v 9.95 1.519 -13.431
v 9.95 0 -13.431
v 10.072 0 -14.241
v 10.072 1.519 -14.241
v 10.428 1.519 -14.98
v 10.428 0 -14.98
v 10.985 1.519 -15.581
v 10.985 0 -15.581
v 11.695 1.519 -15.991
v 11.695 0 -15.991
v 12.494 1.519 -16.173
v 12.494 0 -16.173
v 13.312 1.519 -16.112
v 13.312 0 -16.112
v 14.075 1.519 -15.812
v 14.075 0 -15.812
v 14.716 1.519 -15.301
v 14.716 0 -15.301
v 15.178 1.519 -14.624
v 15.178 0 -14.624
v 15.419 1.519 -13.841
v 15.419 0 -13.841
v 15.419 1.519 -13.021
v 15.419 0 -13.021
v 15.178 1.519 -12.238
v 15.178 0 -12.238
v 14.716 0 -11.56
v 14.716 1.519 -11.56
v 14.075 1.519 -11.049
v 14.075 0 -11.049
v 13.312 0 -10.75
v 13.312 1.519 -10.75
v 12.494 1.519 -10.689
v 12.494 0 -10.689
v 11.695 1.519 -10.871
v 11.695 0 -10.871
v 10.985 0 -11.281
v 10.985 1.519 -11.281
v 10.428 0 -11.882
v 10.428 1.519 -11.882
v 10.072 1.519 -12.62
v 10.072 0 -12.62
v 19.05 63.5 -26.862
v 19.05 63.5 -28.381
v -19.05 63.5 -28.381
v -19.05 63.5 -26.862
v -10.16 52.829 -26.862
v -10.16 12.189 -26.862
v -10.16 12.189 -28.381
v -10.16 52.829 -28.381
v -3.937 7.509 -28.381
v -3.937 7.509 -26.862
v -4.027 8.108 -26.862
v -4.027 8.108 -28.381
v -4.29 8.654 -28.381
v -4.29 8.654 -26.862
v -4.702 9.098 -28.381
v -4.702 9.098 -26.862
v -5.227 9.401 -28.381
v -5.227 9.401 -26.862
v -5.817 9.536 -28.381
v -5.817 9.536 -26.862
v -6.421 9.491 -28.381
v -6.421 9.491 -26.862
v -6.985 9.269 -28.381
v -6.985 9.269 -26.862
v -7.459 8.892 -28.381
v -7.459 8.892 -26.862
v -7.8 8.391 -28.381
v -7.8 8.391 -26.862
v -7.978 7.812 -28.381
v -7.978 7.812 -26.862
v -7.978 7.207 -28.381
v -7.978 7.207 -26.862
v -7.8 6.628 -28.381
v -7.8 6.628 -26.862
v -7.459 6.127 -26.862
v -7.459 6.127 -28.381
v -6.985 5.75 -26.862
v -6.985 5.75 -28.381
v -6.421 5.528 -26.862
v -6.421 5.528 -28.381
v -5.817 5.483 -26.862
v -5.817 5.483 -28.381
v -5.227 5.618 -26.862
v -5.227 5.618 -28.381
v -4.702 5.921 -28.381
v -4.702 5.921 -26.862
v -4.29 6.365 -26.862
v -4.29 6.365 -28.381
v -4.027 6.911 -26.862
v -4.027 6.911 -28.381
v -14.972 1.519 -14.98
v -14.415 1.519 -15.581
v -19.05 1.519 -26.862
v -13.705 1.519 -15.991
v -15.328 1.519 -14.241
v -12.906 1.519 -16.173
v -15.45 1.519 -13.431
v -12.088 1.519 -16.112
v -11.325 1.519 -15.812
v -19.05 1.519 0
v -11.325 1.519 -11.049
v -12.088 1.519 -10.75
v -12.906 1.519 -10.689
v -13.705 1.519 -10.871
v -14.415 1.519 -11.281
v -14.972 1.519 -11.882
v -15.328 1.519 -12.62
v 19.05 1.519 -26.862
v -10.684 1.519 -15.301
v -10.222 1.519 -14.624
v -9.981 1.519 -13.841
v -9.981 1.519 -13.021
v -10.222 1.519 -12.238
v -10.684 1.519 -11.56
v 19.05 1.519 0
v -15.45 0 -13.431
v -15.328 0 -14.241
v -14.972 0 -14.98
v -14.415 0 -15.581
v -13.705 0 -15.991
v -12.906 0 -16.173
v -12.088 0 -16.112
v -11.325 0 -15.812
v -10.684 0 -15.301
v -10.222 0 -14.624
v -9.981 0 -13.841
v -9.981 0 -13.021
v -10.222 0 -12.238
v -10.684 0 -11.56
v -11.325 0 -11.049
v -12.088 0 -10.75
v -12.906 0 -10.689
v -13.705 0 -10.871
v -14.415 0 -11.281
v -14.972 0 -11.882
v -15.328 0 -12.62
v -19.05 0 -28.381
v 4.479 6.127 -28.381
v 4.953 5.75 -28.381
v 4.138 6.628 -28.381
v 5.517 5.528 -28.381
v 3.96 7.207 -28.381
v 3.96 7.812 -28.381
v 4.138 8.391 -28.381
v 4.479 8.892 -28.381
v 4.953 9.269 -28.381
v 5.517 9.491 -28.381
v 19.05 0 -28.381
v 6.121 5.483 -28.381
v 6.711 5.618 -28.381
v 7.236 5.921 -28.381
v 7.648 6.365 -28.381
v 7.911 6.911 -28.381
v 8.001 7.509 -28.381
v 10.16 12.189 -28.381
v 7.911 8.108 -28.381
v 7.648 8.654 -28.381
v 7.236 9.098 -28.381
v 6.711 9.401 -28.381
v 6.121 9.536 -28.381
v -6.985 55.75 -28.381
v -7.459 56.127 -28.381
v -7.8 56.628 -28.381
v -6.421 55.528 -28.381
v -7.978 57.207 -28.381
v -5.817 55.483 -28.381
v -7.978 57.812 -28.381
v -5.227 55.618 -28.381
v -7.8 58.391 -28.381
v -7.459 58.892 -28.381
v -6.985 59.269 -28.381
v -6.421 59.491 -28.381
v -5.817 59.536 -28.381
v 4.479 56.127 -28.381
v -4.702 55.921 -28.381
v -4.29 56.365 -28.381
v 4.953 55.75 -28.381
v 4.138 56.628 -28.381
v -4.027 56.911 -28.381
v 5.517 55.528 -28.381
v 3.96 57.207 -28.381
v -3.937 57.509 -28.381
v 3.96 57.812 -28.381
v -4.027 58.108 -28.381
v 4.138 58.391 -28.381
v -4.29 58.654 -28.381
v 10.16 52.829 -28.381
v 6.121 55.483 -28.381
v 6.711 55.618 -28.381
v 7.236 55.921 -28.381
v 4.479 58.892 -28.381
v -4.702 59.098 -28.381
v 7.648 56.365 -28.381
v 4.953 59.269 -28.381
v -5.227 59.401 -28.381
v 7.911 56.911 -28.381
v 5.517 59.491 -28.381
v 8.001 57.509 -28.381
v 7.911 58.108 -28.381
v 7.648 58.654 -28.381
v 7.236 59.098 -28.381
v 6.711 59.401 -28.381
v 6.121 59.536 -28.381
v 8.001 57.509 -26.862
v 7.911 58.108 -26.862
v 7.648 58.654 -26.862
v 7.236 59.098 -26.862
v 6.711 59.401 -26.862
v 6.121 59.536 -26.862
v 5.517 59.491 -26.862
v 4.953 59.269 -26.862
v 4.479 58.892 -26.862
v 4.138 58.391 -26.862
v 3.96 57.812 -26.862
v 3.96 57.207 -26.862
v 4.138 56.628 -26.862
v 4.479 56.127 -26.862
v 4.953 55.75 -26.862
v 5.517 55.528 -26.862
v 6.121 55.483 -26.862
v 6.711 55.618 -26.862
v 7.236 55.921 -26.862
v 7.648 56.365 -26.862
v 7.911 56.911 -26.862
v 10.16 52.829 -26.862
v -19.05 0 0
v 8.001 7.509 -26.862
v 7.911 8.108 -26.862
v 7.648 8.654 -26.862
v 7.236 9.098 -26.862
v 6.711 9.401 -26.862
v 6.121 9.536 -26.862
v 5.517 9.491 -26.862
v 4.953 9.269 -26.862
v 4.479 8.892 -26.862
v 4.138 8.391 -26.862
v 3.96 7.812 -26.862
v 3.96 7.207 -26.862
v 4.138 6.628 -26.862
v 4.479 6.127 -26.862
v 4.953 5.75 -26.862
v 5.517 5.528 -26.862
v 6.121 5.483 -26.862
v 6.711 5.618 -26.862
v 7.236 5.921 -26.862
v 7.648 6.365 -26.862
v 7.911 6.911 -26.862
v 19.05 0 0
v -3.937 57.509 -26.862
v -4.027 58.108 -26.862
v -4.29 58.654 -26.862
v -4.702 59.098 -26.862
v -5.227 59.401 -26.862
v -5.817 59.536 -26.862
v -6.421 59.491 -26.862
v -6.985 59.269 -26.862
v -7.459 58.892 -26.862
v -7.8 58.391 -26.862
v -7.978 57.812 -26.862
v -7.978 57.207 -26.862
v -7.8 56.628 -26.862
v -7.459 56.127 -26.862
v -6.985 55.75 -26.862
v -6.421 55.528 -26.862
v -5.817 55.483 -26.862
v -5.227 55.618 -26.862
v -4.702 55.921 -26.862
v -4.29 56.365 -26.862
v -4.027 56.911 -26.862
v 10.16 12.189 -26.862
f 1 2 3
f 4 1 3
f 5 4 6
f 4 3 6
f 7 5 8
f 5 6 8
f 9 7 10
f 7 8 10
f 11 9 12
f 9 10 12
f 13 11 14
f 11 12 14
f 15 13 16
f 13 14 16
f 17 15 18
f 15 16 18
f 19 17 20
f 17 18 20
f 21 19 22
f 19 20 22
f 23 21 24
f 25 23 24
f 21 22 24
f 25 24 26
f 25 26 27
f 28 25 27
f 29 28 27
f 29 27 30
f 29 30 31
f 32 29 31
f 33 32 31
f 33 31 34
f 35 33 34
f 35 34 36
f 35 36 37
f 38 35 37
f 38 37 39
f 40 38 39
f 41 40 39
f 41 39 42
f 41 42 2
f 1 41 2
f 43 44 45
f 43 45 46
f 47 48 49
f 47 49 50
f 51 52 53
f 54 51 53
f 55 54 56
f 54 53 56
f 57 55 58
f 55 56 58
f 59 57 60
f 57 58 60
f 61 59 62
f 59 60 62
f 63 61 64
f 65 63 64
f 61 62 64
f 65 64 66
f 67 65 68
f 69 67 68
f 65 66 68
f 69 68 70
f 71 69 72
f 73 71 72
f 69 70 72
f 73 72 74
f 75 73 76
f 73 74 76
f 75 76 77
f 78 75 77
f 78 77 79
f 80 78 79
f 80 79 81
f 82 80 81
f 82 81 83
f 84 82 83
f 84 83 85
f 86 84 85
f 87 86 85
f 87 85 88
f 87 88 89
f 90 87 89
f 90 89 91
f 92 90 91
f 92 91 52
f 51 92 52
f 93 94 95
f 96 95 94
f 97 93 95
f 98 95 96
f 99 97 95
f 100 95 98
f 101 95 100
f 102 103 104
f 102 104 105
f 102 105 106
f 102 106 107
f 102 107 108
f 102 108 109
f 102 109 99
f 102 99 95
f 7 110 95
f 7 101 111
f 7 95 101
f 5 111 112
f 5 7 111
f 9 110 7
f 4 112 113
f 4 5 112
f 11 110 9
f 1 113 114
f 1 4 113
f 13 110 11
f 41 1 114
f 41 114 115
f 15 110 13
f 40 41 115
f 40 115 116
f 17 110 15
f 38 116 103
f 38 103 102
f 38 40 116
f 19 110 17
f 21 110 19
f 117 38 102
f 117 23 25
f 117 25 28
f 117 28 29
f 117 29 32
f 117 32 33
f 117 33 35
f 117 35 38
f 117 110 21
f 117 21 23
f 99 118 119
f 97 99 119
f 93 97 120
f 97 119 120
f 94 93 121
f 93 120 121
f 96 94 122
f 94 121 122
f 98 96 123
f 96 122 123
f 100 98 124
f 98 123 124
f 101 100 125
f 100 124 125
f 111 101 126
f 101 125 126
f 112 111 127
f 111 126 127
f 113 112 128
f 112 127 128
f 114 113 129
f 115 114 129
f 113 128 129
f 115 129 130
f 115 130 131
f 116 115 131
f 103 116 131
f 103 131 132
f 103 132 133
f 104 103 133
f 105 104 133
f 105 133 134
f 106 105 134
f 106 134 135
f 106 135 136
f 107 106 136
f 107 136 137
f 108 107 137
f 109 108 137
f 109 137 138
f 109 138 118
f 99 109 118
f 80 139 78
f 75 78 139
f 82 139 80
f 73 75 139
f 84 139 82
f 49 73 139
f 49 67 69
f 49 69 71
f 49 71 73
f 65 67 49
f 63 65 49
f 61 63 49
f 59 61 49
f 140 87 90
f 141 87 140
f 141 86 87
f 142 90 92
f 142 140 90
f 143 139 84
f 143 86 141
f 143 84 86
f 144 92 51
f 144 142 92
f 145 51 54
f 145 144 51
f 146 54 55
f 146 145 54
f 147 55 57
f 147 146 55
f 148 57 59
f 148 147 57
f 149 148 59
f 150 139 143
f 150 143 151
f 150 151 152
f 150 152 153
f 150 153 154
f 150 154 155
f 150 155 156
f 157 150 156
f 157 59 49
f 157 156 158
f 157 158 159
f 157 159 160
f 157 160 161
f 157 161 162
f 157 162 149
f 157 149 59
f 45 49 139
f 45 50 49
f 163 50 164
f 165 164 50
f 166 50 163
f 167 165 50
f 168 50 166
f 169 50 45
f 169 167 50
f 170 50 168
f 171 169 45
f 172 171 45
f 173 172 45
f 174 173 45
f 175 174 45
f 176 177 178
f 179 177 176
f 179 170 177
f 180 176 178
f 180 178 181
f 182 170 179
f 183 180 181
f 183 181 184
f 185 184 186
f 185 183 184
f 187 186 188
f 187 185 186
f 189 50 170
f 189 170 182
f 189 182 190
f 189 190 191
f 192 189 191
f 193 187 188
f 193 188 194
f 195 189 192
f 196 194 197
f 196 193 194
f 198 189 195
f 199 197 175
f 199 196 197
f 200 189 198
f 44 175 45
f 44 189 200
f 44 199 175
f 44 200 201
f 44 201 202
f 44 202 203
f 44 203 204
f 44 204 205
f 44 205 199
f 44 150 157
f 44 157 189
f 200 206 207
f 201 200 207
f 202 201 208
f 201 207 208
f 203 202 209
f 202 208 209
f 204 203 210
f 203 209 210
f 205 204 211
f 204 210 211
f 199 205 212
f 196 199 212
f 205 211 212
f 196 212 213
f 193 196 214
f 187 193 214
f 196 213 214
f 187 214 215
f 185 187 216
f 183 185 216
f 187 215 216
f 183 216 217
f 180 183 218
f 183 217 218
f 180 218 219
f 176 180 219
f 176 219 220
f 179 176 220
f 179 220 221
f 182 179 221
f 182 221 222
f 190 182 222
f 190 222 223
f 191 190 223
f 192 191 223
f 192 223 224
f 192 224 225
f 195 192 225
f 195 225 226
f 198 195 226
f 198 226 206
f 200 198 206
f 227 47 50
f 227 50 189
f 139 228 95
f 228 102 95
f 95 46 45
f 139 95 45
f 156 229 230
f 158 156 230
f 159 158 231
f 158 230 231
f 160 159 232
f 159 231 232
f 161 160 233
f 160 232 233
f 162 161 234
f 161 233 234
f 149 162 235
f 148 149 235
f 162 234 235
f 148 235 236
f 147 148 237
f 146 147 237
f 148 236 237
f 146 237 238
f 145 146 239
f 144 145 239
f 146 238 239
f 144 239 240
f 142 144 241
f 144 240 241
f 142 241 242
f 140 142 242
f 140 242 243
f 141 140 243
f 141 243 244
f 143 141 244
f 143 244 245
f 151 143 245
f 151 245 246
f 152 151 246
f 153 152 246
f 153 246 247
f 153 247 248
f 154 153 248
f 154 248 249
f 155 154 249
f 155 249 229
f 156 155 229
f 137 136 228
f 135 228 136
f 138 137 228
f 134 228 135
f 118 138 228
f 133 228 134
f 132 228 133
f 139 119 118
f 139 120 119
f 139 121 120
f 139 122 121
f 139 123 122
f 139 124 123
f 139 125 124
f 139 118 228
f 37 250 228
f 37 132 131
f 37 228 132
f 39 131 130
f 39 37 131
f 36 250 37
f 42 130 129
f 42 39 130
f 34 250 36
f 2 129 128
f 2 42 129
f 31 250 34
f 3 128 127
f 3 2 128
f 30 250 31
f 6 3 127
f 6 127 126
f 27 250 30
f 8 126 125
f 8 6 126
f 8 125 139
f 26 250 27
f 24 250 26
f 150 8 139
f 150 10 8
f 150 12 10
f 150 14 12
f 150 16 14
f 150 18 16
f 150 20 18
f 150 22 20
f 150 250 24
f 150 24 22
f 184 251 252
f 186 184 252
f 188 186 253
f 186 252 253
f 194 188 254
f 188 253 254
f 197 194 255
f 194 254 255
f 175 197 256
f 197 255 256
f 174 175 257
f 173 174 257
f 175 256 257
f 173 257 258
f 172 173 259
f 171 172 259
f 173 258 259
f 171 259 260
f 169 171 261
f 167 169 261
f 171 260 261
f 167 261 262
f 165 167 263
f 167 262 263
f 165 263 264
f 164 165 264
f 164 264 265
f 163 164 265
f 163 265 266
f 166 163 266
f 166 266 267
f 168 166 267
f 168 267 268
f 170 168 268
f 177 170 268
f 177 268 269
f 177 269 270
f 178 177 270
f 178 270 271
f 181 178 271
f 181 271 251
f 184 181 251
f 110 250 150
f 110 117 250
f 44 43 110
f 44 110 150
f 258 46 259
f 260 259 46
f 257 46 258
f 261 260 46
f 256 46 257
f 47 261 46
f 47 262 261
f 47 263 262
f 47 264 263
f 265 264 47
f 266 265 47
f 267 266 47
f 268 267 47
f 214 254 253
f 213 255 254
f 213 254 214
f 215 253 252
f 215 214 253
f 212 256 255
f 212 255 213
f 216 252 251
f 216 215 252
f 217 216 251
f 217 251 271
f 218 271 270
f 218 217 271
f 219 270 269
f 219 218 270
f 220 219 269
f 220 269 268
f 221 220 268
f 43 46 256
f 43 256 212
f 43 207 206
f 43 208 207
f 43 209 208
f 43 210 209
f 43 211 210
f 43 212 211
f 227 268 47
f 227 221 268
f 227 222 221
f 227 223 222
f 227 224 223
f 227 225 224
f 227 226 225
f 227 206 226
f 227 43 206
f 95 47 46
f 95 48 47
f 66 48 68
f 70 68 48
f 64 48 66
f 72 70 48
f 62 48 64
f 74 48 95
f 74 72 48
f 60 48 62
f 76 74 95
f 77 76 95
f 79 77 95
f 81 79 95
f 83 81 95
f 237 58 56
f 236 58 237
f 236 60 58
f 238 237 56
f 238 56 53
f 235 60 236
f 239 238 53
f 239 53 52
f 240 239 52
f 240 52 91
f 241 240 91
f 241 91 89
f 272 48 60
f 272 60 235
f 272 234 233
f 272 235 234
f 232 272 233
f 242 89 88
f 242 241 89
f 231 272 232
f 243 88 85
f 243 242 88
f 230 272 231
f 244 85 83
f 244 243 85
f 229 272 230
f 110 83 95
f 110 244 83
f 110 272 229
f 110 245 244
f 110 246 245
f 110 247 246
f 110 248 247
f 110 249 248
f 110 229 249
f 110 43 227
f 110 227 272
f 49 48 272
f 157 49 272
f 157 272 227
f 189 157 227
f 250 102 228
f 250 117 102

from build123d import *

# Parameters (mm, degrees)
BOSS_EXTRUDE1_DEPTH  = 19.05
M5_CLEARANCE_HOLE1_D = 5.5
CUT_EXTRUDE1_REACH   = 3.519
SKETCH5_W            = 20.32
SKETCH5_H            = 40.64
CUT_EXTRUDE2_REACH   = 3.519
SKETCH6_R            = 2.032


with BuildPart() as part:
    # Sketch1 → Boss-Extrude1 (new body, symmetric)
    with BuildSketch(Plane(origin=(0, 0, 0), x_dir=(0, 0, -1), z_dir=(1, 0, 0))):
        Polygon((0, 0), (28.380612245, 0), (28.380612245, 63.5), (26.861692245, 63.5), (26.861692245, 1.51892), (0, 1.51892), align=None)
    extrude(amount=BOSS_EXTRUDE1_DEPTH, both=True)

    # M5 Clearance Hole1 (through all)
    with Locations(Plane(origin=(0, 1.51892, 0), x_dir=(1, 0, 0), z_dir=(0, 1, 0))):
        with Locations((-12.7, 13.430846122), (12.7, 13.430846122)):
            Hole(M5_CLEARANCE_HOLE1_D / 2)

    # Sketch5 → Cut-Extrude1 (cut, up to next)
    with BuildSketch(Plane.XY.offset(-26.861692245), mode=Mode.PRIVATE) as cut_extrude1_sk1:
        with Locations((0, 32.50946)):
            Rectangle(SKETCH5_W, SKETCH5_H)
    cut_extrude1_tool1 = extrude(cut_extrude1_sk1.sketch, amount=-CUT_EXTRUDE1_REACH, mode=Mode.PRIVATE) & part.part
    add(cut_extrude1_tool1.solids().sort_by_distance((0, 32.50946, -26.861692))[0], mode=Mode.SUBTRACT)

    # Sketch6 → Cut-Extrude2 (cut, up to next)
    with BuildSketch(Plane.XY.offset(-26.861692245), mode=Mode.PRIVATE) as cut_extrude2_sk1:
        with Locations((-5.969, 57.50946)):
            Circle(SKETCH6_R)
    cut_extrude2_tool1 = extrude(cut_extrude2_sk1.sketch, amount=-CUT_EXTRUDE2_REACH, mode=Mode.PRIVATE) & part.part
    add(cut_extrude2_tool1.solids().sort_by_distance((-5.969, 57.50946, -26.861692))[0], mode=Mode.SUBTRACT)
    # Sketch6 → Cut-Extrude2 (cut, up to next)
    with BuildSketch(Plane.XY.offset(-26.861692245), mode=Mode.PRIVATE) as cut_extrude2_sk2:
        with Locations((5.969, 57.50946)):
            Circle(SKETCH6_R)
    cut_extrude2_tool2 = extrude(cut_extrude2_sk2.sketch, amount=-CUT_EXTRUDE2_REACH, mode=Mode.PRIVATE) & part.part
    add(cut_extrude2_tool2.solids().sort_by_distance((5.969, 57.50946, -26.861692))[0], mode=Mode.SUBTRACT)
    # Sketch6 → Cut-Extrude2 (cut, up to next)
    with BuildSketch(Plane.XY.offset(-26.861692245), mode=Mode.PRIVATE) as cut_extrude2_sk3:
        with Locations((-5.969, 7.50946)):
            Circle(SKETCH6_R)
    cut_extrude2_tool3 = extrude(cut_extrude2_sk3.sketch, amount=-CUT_EXTRUDE2_REACH, mode=Mode.PRIVATE) & part.part
    add(cut_extrude2_tool3.solids().sort_by_distance((-5.969, 7.50946, -26.861692))[0], mode=Mode.SUBTRACT)
    # Sketch6 → Cut-Extrude2 (cut, up to next)
    with BuildSketch(Plane.XY.offset(-26.861692245), mode=Mode.PRIVATE) as cut_extrude2_sk4:
        with Locations((5.969, 7.50946)):
            Circle(SKETCH6_R)
    cut_extrude2_tool4 = extrude(cut_extrude2_sk4.sketch, amount=-CUT_EXTRUDE2_REACH, mode=Mode.PRIVATE) & part.part
    add(cut_extrude2_tool4.solids().sort_by_distance((5.969, 7.50946, -26.861692))[0], mode=Mode.SUBTRACT)


solid = part.part
